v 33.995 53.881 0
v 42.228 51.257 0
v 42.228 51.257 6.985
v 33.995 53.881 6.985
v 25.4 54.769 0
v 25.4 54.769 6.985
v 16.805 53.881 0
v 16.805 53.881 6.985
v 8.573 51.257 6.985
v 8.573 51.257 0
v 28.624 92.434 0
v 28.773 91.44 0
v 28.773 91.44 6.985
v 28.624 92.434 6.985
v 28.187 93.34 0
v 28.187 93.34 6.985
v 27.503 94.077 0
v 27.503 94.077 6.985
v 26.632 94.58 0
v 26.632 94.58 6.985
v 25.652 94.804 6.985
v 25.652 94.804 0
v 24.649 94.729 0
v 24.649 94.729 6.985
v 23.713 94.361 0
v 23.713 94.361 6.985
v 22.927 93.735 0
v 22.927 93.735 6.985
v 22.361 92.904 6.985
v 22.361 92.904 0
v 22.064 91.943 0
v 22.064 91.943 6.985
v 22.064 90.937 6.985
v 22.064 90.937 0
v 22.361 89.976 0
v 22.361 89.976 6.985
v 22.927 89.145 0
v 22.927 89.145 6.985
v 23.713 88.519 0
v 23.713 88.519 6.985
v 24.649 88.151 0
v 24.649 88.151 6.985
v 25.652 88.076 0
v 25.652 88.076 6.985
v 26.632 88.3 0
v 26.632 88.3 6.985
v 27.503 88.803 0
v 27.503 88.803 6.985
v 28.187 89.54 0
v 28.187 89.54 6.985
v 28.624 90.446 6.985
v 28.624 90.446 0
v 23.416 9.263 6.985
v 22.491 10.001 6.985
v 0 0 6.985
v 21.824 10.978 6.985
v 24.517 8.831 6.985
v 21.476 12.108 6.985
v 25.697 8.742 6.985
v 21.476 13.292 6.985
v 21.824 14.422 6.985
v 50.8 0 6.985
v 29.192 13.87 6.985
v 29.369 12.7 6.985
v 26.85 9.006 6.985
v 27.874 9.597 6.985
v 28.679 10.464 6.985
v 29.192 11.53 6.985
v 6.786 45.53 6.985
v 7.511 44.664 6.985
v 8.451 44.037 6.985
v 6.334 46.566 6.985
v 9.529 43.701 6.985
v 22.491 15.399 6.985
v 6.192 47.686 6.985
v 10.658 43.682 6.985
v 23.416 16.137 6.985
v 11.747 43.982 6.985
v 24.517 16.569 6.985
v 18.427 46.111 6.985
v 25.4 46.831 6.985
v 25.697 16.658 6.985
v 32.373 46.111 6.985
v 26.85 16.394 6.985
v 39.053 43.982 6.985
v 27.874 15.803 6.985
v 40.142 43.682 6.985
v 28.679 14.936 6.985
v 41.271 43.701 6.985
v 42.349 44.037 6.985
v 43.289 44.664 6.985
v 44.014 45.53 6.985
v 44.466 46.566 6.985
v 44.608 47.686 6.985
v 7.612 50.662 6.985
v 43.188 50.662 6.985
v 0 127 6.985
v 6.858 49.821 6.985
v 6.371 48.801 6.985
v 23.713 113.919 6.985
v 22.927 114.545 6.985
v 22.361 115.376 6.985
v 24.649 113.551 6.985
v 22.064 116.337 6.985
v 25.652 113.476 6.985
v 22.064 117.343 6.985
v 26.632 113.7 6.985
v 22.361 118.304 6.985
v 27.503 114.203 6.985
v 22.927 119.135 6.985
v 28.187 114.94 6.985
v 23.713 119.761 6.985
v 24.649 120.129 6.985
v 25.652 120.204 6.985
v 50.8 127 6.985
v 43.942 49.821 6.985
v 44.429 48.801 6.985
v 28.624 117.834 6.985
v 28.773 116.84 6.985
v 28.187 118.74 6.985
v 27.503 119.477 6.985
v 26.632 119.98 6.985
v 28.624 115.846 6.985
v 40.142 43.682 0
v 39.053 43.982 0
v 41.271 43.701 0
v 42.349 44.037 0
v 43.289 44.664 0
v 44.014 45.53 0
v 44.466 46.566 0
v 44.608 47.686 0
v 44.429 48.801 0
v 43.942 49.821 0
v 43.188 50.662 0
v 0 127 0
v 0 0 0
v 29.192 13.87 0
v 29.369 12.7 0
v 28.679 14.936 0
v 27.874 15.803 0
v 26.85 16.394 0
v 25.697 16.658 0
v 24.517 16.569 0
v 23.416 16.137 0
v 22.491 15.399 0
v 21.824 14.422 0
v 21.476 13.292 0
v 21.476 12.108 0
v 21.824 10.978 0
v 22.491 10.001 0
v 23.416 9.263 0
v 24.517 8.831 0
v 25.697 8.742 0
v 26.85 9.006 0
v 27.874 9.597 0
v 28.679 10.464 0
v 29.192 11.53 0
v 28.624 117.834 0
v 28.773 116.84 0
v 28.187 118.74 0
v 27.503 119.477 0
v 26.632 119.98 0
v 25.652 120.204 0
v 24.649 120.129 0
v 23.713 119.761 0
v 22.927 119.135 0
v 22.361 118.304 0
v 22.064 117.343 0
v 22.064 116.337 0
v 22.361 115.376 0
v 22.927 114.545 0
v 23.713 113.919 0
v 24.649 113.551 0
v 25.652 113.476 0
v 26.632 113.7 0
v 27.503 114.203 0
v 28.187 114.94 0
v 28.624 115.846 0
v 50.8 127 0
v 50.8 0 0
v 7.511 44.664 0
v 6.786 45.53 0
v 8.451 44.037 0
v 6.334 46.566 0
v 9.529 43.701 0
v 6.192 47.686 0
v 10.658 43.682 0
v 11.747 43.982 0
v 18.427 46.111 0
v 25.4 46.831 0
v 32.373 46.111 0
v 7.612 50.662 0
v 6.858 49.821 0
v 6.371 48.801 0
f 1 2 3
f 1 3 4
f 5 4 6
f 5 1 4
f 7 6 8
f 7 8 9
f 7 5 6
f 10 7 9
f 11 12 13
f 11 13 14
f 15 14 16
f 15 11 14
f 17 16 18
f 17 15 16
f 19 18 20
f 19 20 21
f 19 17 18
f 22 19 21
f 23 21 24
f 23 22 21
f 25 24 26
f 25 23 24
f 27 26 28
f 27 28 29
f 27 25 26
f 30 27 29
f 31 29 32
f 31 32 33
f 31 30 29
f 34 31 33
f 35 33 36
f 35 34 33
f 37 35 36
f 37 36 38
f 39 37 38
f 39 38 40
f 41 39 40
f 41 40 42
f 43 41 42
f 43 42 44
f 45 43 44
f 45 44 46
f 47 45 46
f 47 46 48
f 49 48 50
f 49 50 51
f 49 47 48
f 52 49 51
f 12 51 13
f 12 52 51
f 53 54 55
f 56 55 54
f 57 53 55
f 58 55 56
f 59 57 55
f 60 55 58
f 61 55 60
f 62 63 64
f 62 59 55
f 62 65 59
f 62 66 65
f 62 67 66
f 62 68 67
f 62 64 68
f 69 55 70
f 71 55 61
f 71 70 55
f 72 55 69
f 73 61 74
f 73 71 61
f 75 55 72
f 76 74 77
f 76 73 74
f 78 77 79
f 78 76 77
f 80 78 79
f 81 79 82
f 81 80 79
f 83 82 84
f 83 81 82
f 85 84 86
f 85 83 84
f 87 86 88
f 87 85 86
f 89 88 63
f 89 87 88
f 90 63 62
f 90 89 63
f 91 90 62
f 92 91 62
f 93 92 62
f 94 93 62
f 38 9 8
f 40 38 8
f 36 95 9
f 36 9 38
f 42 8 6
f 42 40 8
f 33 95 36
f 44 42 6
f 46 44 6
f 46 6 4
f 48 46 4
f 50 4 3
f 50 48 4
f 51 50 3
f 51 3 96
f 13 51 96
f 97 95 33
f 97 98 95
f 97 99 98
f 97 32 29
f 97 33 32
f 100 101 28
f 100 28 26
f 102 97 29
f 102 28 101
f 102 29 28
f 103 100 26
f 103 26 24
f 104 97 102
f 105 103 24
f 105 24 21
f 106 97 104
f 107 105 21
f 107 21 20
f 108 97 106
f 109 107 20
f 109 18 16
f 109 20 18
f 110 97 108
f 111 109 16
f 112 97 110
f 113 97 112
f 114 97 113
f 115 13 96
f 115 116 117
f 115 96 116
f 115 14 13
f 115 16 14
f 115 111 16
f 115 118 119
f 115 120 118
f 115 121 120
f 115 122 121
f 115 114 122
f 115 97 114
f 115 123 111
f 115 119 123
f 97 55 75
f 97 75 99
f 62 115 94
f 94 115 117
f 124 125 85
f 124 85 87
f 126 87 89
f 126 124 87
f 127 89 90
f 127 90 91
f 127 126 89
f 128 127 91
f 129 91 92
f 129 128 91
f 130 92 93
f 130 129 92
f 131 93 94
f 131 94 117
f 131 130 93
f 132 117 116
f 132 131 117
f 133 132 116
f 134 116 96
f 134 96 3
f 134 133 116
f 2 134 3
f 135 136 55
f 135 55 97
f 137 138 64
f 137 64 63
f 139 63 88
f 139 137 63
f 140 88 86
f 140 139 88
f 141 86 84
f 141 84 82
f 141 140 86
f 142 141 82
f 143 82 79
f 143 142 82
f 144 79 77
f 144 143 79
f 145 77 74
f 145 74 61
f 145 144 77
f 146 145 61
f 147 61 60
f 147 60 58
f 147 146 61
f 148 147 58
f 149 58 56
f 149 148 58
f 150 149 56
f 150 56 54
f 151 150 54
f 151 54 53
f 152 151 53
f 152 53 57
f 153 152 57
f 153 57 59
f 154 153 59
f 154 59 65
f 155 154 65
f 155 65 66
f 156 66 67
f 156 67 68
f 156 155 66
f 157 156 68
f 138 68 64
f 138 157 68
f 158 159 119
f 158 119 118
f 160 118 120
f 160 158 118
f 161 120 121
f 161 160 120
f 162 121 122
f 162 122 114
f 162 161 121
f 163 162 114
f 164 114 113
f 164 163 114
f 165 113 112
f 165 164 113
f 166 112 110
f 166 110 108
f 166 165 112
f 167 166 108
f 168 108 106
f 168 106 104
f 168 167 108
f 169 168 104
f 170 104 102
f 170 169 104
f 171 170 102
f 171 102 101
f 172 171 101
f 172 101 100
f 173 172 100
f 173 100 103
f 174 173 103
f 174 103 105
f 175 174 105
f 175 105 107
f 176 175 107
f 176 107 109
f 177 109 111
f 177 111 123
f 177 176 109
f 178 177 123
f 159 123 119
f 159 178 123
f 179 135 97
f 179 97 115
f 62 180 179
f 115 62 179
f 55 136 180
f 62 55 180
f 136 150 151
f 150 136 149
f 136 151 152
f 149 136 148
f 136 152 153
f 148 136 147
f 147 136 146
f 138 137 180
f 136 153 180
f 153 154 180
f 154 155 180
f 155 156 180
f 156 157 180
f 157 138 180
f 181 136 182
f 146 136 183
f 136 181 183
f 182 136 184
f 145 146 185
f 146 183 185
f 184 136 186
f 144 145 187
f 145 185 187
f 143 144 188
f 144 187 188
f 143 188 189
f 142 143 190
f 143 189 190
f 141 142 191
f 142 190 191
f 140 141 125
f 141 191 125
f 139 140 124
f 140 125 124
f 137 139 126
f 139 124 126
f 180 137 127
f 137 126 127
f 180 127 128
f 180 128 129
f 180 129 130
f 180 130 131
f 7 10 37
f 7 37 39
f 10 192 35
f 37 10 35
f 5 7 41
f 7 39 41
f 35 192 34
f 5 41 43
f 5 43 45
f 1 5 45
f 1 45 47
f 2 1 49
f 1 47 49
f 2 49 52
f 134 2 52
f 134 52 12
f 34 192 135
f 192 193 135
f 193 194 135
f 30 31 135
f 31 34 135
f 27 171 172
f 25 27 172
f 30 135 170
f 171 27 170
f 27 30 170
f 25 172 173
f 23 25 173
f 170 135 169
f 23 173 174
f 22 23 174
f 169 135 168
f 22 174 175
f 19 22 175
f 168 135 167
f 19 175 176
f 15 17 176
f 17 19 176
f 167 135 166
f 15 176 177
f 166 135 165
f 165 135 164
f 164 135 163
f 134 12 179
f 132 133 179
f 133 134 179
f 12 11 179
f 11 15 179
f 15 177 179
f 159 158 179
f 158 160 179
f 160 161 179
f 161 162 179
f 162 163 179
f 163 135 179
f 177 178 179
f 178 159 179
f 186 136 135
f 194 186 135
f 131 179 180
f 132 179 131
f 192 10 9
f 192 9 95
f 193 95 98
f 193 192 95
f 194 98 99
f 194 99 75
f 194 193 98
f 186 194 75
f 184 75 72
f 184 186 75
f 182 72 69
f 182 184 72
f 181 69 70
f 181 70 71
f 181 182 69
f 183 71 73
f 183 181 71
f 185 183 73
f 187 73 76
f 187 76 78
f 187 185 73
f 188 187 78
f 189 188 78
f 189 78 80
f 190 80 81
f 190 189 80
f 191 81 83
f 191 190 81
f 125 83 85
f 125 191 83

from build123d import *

# Parameters (mm, degrees)
SKETCH1_W           = 50.8
SKETCH1_H           = 127
SKETCH1_R           = 3.96875
SKETCH1_R_2         = 3.3734375
BOSS_EXTRUDE2_DEPTH = 6.985


with BuildPart() as part:
    # Sketch1 → Boss-Extrude2 (new body)
    with BuildSketch(Plane.XY):
        with Locations((25.4, 63.5)):
            Rectangle(SKETCH1_W, SKETCH1_H)
        with Locations((25.4, 12.7)):
            Circle(SKETCH1_R, mode=Mode.SUBTRACT)
        with Locations((25.4, 116.84)):
            Circle(SKETCH1_R_2, mode=Mode.SUBTRACT)
        with Locations((25.4, 91.44)):
            Circle(SKETCH1_R_2, mode=Mode.SUBTRACT)
        with BuildLine():
            ThreePointArc((42.2275, 51.256646253), (25.4, 54.76875), (8.5725, 51.256646253))
            ThreePointArc((8.5725, 51.256646253), (6.522580542, 46.031726796), (11.7475, 43.981807338))
            ThreePointArc((11.7475, 43.981807338), (25.4, 46.83125), (39.0525, 43.981807338))
            ThreePointArc((39.0525, 43.981807338), (44.277419458, 46.031726796), (42.2275, 51.256646253))
        make_face(mode=Mode.SUBTRACT)
    extrude(amount=BOSS_EXTRUDE2_DEPTH)


solid = part.part
